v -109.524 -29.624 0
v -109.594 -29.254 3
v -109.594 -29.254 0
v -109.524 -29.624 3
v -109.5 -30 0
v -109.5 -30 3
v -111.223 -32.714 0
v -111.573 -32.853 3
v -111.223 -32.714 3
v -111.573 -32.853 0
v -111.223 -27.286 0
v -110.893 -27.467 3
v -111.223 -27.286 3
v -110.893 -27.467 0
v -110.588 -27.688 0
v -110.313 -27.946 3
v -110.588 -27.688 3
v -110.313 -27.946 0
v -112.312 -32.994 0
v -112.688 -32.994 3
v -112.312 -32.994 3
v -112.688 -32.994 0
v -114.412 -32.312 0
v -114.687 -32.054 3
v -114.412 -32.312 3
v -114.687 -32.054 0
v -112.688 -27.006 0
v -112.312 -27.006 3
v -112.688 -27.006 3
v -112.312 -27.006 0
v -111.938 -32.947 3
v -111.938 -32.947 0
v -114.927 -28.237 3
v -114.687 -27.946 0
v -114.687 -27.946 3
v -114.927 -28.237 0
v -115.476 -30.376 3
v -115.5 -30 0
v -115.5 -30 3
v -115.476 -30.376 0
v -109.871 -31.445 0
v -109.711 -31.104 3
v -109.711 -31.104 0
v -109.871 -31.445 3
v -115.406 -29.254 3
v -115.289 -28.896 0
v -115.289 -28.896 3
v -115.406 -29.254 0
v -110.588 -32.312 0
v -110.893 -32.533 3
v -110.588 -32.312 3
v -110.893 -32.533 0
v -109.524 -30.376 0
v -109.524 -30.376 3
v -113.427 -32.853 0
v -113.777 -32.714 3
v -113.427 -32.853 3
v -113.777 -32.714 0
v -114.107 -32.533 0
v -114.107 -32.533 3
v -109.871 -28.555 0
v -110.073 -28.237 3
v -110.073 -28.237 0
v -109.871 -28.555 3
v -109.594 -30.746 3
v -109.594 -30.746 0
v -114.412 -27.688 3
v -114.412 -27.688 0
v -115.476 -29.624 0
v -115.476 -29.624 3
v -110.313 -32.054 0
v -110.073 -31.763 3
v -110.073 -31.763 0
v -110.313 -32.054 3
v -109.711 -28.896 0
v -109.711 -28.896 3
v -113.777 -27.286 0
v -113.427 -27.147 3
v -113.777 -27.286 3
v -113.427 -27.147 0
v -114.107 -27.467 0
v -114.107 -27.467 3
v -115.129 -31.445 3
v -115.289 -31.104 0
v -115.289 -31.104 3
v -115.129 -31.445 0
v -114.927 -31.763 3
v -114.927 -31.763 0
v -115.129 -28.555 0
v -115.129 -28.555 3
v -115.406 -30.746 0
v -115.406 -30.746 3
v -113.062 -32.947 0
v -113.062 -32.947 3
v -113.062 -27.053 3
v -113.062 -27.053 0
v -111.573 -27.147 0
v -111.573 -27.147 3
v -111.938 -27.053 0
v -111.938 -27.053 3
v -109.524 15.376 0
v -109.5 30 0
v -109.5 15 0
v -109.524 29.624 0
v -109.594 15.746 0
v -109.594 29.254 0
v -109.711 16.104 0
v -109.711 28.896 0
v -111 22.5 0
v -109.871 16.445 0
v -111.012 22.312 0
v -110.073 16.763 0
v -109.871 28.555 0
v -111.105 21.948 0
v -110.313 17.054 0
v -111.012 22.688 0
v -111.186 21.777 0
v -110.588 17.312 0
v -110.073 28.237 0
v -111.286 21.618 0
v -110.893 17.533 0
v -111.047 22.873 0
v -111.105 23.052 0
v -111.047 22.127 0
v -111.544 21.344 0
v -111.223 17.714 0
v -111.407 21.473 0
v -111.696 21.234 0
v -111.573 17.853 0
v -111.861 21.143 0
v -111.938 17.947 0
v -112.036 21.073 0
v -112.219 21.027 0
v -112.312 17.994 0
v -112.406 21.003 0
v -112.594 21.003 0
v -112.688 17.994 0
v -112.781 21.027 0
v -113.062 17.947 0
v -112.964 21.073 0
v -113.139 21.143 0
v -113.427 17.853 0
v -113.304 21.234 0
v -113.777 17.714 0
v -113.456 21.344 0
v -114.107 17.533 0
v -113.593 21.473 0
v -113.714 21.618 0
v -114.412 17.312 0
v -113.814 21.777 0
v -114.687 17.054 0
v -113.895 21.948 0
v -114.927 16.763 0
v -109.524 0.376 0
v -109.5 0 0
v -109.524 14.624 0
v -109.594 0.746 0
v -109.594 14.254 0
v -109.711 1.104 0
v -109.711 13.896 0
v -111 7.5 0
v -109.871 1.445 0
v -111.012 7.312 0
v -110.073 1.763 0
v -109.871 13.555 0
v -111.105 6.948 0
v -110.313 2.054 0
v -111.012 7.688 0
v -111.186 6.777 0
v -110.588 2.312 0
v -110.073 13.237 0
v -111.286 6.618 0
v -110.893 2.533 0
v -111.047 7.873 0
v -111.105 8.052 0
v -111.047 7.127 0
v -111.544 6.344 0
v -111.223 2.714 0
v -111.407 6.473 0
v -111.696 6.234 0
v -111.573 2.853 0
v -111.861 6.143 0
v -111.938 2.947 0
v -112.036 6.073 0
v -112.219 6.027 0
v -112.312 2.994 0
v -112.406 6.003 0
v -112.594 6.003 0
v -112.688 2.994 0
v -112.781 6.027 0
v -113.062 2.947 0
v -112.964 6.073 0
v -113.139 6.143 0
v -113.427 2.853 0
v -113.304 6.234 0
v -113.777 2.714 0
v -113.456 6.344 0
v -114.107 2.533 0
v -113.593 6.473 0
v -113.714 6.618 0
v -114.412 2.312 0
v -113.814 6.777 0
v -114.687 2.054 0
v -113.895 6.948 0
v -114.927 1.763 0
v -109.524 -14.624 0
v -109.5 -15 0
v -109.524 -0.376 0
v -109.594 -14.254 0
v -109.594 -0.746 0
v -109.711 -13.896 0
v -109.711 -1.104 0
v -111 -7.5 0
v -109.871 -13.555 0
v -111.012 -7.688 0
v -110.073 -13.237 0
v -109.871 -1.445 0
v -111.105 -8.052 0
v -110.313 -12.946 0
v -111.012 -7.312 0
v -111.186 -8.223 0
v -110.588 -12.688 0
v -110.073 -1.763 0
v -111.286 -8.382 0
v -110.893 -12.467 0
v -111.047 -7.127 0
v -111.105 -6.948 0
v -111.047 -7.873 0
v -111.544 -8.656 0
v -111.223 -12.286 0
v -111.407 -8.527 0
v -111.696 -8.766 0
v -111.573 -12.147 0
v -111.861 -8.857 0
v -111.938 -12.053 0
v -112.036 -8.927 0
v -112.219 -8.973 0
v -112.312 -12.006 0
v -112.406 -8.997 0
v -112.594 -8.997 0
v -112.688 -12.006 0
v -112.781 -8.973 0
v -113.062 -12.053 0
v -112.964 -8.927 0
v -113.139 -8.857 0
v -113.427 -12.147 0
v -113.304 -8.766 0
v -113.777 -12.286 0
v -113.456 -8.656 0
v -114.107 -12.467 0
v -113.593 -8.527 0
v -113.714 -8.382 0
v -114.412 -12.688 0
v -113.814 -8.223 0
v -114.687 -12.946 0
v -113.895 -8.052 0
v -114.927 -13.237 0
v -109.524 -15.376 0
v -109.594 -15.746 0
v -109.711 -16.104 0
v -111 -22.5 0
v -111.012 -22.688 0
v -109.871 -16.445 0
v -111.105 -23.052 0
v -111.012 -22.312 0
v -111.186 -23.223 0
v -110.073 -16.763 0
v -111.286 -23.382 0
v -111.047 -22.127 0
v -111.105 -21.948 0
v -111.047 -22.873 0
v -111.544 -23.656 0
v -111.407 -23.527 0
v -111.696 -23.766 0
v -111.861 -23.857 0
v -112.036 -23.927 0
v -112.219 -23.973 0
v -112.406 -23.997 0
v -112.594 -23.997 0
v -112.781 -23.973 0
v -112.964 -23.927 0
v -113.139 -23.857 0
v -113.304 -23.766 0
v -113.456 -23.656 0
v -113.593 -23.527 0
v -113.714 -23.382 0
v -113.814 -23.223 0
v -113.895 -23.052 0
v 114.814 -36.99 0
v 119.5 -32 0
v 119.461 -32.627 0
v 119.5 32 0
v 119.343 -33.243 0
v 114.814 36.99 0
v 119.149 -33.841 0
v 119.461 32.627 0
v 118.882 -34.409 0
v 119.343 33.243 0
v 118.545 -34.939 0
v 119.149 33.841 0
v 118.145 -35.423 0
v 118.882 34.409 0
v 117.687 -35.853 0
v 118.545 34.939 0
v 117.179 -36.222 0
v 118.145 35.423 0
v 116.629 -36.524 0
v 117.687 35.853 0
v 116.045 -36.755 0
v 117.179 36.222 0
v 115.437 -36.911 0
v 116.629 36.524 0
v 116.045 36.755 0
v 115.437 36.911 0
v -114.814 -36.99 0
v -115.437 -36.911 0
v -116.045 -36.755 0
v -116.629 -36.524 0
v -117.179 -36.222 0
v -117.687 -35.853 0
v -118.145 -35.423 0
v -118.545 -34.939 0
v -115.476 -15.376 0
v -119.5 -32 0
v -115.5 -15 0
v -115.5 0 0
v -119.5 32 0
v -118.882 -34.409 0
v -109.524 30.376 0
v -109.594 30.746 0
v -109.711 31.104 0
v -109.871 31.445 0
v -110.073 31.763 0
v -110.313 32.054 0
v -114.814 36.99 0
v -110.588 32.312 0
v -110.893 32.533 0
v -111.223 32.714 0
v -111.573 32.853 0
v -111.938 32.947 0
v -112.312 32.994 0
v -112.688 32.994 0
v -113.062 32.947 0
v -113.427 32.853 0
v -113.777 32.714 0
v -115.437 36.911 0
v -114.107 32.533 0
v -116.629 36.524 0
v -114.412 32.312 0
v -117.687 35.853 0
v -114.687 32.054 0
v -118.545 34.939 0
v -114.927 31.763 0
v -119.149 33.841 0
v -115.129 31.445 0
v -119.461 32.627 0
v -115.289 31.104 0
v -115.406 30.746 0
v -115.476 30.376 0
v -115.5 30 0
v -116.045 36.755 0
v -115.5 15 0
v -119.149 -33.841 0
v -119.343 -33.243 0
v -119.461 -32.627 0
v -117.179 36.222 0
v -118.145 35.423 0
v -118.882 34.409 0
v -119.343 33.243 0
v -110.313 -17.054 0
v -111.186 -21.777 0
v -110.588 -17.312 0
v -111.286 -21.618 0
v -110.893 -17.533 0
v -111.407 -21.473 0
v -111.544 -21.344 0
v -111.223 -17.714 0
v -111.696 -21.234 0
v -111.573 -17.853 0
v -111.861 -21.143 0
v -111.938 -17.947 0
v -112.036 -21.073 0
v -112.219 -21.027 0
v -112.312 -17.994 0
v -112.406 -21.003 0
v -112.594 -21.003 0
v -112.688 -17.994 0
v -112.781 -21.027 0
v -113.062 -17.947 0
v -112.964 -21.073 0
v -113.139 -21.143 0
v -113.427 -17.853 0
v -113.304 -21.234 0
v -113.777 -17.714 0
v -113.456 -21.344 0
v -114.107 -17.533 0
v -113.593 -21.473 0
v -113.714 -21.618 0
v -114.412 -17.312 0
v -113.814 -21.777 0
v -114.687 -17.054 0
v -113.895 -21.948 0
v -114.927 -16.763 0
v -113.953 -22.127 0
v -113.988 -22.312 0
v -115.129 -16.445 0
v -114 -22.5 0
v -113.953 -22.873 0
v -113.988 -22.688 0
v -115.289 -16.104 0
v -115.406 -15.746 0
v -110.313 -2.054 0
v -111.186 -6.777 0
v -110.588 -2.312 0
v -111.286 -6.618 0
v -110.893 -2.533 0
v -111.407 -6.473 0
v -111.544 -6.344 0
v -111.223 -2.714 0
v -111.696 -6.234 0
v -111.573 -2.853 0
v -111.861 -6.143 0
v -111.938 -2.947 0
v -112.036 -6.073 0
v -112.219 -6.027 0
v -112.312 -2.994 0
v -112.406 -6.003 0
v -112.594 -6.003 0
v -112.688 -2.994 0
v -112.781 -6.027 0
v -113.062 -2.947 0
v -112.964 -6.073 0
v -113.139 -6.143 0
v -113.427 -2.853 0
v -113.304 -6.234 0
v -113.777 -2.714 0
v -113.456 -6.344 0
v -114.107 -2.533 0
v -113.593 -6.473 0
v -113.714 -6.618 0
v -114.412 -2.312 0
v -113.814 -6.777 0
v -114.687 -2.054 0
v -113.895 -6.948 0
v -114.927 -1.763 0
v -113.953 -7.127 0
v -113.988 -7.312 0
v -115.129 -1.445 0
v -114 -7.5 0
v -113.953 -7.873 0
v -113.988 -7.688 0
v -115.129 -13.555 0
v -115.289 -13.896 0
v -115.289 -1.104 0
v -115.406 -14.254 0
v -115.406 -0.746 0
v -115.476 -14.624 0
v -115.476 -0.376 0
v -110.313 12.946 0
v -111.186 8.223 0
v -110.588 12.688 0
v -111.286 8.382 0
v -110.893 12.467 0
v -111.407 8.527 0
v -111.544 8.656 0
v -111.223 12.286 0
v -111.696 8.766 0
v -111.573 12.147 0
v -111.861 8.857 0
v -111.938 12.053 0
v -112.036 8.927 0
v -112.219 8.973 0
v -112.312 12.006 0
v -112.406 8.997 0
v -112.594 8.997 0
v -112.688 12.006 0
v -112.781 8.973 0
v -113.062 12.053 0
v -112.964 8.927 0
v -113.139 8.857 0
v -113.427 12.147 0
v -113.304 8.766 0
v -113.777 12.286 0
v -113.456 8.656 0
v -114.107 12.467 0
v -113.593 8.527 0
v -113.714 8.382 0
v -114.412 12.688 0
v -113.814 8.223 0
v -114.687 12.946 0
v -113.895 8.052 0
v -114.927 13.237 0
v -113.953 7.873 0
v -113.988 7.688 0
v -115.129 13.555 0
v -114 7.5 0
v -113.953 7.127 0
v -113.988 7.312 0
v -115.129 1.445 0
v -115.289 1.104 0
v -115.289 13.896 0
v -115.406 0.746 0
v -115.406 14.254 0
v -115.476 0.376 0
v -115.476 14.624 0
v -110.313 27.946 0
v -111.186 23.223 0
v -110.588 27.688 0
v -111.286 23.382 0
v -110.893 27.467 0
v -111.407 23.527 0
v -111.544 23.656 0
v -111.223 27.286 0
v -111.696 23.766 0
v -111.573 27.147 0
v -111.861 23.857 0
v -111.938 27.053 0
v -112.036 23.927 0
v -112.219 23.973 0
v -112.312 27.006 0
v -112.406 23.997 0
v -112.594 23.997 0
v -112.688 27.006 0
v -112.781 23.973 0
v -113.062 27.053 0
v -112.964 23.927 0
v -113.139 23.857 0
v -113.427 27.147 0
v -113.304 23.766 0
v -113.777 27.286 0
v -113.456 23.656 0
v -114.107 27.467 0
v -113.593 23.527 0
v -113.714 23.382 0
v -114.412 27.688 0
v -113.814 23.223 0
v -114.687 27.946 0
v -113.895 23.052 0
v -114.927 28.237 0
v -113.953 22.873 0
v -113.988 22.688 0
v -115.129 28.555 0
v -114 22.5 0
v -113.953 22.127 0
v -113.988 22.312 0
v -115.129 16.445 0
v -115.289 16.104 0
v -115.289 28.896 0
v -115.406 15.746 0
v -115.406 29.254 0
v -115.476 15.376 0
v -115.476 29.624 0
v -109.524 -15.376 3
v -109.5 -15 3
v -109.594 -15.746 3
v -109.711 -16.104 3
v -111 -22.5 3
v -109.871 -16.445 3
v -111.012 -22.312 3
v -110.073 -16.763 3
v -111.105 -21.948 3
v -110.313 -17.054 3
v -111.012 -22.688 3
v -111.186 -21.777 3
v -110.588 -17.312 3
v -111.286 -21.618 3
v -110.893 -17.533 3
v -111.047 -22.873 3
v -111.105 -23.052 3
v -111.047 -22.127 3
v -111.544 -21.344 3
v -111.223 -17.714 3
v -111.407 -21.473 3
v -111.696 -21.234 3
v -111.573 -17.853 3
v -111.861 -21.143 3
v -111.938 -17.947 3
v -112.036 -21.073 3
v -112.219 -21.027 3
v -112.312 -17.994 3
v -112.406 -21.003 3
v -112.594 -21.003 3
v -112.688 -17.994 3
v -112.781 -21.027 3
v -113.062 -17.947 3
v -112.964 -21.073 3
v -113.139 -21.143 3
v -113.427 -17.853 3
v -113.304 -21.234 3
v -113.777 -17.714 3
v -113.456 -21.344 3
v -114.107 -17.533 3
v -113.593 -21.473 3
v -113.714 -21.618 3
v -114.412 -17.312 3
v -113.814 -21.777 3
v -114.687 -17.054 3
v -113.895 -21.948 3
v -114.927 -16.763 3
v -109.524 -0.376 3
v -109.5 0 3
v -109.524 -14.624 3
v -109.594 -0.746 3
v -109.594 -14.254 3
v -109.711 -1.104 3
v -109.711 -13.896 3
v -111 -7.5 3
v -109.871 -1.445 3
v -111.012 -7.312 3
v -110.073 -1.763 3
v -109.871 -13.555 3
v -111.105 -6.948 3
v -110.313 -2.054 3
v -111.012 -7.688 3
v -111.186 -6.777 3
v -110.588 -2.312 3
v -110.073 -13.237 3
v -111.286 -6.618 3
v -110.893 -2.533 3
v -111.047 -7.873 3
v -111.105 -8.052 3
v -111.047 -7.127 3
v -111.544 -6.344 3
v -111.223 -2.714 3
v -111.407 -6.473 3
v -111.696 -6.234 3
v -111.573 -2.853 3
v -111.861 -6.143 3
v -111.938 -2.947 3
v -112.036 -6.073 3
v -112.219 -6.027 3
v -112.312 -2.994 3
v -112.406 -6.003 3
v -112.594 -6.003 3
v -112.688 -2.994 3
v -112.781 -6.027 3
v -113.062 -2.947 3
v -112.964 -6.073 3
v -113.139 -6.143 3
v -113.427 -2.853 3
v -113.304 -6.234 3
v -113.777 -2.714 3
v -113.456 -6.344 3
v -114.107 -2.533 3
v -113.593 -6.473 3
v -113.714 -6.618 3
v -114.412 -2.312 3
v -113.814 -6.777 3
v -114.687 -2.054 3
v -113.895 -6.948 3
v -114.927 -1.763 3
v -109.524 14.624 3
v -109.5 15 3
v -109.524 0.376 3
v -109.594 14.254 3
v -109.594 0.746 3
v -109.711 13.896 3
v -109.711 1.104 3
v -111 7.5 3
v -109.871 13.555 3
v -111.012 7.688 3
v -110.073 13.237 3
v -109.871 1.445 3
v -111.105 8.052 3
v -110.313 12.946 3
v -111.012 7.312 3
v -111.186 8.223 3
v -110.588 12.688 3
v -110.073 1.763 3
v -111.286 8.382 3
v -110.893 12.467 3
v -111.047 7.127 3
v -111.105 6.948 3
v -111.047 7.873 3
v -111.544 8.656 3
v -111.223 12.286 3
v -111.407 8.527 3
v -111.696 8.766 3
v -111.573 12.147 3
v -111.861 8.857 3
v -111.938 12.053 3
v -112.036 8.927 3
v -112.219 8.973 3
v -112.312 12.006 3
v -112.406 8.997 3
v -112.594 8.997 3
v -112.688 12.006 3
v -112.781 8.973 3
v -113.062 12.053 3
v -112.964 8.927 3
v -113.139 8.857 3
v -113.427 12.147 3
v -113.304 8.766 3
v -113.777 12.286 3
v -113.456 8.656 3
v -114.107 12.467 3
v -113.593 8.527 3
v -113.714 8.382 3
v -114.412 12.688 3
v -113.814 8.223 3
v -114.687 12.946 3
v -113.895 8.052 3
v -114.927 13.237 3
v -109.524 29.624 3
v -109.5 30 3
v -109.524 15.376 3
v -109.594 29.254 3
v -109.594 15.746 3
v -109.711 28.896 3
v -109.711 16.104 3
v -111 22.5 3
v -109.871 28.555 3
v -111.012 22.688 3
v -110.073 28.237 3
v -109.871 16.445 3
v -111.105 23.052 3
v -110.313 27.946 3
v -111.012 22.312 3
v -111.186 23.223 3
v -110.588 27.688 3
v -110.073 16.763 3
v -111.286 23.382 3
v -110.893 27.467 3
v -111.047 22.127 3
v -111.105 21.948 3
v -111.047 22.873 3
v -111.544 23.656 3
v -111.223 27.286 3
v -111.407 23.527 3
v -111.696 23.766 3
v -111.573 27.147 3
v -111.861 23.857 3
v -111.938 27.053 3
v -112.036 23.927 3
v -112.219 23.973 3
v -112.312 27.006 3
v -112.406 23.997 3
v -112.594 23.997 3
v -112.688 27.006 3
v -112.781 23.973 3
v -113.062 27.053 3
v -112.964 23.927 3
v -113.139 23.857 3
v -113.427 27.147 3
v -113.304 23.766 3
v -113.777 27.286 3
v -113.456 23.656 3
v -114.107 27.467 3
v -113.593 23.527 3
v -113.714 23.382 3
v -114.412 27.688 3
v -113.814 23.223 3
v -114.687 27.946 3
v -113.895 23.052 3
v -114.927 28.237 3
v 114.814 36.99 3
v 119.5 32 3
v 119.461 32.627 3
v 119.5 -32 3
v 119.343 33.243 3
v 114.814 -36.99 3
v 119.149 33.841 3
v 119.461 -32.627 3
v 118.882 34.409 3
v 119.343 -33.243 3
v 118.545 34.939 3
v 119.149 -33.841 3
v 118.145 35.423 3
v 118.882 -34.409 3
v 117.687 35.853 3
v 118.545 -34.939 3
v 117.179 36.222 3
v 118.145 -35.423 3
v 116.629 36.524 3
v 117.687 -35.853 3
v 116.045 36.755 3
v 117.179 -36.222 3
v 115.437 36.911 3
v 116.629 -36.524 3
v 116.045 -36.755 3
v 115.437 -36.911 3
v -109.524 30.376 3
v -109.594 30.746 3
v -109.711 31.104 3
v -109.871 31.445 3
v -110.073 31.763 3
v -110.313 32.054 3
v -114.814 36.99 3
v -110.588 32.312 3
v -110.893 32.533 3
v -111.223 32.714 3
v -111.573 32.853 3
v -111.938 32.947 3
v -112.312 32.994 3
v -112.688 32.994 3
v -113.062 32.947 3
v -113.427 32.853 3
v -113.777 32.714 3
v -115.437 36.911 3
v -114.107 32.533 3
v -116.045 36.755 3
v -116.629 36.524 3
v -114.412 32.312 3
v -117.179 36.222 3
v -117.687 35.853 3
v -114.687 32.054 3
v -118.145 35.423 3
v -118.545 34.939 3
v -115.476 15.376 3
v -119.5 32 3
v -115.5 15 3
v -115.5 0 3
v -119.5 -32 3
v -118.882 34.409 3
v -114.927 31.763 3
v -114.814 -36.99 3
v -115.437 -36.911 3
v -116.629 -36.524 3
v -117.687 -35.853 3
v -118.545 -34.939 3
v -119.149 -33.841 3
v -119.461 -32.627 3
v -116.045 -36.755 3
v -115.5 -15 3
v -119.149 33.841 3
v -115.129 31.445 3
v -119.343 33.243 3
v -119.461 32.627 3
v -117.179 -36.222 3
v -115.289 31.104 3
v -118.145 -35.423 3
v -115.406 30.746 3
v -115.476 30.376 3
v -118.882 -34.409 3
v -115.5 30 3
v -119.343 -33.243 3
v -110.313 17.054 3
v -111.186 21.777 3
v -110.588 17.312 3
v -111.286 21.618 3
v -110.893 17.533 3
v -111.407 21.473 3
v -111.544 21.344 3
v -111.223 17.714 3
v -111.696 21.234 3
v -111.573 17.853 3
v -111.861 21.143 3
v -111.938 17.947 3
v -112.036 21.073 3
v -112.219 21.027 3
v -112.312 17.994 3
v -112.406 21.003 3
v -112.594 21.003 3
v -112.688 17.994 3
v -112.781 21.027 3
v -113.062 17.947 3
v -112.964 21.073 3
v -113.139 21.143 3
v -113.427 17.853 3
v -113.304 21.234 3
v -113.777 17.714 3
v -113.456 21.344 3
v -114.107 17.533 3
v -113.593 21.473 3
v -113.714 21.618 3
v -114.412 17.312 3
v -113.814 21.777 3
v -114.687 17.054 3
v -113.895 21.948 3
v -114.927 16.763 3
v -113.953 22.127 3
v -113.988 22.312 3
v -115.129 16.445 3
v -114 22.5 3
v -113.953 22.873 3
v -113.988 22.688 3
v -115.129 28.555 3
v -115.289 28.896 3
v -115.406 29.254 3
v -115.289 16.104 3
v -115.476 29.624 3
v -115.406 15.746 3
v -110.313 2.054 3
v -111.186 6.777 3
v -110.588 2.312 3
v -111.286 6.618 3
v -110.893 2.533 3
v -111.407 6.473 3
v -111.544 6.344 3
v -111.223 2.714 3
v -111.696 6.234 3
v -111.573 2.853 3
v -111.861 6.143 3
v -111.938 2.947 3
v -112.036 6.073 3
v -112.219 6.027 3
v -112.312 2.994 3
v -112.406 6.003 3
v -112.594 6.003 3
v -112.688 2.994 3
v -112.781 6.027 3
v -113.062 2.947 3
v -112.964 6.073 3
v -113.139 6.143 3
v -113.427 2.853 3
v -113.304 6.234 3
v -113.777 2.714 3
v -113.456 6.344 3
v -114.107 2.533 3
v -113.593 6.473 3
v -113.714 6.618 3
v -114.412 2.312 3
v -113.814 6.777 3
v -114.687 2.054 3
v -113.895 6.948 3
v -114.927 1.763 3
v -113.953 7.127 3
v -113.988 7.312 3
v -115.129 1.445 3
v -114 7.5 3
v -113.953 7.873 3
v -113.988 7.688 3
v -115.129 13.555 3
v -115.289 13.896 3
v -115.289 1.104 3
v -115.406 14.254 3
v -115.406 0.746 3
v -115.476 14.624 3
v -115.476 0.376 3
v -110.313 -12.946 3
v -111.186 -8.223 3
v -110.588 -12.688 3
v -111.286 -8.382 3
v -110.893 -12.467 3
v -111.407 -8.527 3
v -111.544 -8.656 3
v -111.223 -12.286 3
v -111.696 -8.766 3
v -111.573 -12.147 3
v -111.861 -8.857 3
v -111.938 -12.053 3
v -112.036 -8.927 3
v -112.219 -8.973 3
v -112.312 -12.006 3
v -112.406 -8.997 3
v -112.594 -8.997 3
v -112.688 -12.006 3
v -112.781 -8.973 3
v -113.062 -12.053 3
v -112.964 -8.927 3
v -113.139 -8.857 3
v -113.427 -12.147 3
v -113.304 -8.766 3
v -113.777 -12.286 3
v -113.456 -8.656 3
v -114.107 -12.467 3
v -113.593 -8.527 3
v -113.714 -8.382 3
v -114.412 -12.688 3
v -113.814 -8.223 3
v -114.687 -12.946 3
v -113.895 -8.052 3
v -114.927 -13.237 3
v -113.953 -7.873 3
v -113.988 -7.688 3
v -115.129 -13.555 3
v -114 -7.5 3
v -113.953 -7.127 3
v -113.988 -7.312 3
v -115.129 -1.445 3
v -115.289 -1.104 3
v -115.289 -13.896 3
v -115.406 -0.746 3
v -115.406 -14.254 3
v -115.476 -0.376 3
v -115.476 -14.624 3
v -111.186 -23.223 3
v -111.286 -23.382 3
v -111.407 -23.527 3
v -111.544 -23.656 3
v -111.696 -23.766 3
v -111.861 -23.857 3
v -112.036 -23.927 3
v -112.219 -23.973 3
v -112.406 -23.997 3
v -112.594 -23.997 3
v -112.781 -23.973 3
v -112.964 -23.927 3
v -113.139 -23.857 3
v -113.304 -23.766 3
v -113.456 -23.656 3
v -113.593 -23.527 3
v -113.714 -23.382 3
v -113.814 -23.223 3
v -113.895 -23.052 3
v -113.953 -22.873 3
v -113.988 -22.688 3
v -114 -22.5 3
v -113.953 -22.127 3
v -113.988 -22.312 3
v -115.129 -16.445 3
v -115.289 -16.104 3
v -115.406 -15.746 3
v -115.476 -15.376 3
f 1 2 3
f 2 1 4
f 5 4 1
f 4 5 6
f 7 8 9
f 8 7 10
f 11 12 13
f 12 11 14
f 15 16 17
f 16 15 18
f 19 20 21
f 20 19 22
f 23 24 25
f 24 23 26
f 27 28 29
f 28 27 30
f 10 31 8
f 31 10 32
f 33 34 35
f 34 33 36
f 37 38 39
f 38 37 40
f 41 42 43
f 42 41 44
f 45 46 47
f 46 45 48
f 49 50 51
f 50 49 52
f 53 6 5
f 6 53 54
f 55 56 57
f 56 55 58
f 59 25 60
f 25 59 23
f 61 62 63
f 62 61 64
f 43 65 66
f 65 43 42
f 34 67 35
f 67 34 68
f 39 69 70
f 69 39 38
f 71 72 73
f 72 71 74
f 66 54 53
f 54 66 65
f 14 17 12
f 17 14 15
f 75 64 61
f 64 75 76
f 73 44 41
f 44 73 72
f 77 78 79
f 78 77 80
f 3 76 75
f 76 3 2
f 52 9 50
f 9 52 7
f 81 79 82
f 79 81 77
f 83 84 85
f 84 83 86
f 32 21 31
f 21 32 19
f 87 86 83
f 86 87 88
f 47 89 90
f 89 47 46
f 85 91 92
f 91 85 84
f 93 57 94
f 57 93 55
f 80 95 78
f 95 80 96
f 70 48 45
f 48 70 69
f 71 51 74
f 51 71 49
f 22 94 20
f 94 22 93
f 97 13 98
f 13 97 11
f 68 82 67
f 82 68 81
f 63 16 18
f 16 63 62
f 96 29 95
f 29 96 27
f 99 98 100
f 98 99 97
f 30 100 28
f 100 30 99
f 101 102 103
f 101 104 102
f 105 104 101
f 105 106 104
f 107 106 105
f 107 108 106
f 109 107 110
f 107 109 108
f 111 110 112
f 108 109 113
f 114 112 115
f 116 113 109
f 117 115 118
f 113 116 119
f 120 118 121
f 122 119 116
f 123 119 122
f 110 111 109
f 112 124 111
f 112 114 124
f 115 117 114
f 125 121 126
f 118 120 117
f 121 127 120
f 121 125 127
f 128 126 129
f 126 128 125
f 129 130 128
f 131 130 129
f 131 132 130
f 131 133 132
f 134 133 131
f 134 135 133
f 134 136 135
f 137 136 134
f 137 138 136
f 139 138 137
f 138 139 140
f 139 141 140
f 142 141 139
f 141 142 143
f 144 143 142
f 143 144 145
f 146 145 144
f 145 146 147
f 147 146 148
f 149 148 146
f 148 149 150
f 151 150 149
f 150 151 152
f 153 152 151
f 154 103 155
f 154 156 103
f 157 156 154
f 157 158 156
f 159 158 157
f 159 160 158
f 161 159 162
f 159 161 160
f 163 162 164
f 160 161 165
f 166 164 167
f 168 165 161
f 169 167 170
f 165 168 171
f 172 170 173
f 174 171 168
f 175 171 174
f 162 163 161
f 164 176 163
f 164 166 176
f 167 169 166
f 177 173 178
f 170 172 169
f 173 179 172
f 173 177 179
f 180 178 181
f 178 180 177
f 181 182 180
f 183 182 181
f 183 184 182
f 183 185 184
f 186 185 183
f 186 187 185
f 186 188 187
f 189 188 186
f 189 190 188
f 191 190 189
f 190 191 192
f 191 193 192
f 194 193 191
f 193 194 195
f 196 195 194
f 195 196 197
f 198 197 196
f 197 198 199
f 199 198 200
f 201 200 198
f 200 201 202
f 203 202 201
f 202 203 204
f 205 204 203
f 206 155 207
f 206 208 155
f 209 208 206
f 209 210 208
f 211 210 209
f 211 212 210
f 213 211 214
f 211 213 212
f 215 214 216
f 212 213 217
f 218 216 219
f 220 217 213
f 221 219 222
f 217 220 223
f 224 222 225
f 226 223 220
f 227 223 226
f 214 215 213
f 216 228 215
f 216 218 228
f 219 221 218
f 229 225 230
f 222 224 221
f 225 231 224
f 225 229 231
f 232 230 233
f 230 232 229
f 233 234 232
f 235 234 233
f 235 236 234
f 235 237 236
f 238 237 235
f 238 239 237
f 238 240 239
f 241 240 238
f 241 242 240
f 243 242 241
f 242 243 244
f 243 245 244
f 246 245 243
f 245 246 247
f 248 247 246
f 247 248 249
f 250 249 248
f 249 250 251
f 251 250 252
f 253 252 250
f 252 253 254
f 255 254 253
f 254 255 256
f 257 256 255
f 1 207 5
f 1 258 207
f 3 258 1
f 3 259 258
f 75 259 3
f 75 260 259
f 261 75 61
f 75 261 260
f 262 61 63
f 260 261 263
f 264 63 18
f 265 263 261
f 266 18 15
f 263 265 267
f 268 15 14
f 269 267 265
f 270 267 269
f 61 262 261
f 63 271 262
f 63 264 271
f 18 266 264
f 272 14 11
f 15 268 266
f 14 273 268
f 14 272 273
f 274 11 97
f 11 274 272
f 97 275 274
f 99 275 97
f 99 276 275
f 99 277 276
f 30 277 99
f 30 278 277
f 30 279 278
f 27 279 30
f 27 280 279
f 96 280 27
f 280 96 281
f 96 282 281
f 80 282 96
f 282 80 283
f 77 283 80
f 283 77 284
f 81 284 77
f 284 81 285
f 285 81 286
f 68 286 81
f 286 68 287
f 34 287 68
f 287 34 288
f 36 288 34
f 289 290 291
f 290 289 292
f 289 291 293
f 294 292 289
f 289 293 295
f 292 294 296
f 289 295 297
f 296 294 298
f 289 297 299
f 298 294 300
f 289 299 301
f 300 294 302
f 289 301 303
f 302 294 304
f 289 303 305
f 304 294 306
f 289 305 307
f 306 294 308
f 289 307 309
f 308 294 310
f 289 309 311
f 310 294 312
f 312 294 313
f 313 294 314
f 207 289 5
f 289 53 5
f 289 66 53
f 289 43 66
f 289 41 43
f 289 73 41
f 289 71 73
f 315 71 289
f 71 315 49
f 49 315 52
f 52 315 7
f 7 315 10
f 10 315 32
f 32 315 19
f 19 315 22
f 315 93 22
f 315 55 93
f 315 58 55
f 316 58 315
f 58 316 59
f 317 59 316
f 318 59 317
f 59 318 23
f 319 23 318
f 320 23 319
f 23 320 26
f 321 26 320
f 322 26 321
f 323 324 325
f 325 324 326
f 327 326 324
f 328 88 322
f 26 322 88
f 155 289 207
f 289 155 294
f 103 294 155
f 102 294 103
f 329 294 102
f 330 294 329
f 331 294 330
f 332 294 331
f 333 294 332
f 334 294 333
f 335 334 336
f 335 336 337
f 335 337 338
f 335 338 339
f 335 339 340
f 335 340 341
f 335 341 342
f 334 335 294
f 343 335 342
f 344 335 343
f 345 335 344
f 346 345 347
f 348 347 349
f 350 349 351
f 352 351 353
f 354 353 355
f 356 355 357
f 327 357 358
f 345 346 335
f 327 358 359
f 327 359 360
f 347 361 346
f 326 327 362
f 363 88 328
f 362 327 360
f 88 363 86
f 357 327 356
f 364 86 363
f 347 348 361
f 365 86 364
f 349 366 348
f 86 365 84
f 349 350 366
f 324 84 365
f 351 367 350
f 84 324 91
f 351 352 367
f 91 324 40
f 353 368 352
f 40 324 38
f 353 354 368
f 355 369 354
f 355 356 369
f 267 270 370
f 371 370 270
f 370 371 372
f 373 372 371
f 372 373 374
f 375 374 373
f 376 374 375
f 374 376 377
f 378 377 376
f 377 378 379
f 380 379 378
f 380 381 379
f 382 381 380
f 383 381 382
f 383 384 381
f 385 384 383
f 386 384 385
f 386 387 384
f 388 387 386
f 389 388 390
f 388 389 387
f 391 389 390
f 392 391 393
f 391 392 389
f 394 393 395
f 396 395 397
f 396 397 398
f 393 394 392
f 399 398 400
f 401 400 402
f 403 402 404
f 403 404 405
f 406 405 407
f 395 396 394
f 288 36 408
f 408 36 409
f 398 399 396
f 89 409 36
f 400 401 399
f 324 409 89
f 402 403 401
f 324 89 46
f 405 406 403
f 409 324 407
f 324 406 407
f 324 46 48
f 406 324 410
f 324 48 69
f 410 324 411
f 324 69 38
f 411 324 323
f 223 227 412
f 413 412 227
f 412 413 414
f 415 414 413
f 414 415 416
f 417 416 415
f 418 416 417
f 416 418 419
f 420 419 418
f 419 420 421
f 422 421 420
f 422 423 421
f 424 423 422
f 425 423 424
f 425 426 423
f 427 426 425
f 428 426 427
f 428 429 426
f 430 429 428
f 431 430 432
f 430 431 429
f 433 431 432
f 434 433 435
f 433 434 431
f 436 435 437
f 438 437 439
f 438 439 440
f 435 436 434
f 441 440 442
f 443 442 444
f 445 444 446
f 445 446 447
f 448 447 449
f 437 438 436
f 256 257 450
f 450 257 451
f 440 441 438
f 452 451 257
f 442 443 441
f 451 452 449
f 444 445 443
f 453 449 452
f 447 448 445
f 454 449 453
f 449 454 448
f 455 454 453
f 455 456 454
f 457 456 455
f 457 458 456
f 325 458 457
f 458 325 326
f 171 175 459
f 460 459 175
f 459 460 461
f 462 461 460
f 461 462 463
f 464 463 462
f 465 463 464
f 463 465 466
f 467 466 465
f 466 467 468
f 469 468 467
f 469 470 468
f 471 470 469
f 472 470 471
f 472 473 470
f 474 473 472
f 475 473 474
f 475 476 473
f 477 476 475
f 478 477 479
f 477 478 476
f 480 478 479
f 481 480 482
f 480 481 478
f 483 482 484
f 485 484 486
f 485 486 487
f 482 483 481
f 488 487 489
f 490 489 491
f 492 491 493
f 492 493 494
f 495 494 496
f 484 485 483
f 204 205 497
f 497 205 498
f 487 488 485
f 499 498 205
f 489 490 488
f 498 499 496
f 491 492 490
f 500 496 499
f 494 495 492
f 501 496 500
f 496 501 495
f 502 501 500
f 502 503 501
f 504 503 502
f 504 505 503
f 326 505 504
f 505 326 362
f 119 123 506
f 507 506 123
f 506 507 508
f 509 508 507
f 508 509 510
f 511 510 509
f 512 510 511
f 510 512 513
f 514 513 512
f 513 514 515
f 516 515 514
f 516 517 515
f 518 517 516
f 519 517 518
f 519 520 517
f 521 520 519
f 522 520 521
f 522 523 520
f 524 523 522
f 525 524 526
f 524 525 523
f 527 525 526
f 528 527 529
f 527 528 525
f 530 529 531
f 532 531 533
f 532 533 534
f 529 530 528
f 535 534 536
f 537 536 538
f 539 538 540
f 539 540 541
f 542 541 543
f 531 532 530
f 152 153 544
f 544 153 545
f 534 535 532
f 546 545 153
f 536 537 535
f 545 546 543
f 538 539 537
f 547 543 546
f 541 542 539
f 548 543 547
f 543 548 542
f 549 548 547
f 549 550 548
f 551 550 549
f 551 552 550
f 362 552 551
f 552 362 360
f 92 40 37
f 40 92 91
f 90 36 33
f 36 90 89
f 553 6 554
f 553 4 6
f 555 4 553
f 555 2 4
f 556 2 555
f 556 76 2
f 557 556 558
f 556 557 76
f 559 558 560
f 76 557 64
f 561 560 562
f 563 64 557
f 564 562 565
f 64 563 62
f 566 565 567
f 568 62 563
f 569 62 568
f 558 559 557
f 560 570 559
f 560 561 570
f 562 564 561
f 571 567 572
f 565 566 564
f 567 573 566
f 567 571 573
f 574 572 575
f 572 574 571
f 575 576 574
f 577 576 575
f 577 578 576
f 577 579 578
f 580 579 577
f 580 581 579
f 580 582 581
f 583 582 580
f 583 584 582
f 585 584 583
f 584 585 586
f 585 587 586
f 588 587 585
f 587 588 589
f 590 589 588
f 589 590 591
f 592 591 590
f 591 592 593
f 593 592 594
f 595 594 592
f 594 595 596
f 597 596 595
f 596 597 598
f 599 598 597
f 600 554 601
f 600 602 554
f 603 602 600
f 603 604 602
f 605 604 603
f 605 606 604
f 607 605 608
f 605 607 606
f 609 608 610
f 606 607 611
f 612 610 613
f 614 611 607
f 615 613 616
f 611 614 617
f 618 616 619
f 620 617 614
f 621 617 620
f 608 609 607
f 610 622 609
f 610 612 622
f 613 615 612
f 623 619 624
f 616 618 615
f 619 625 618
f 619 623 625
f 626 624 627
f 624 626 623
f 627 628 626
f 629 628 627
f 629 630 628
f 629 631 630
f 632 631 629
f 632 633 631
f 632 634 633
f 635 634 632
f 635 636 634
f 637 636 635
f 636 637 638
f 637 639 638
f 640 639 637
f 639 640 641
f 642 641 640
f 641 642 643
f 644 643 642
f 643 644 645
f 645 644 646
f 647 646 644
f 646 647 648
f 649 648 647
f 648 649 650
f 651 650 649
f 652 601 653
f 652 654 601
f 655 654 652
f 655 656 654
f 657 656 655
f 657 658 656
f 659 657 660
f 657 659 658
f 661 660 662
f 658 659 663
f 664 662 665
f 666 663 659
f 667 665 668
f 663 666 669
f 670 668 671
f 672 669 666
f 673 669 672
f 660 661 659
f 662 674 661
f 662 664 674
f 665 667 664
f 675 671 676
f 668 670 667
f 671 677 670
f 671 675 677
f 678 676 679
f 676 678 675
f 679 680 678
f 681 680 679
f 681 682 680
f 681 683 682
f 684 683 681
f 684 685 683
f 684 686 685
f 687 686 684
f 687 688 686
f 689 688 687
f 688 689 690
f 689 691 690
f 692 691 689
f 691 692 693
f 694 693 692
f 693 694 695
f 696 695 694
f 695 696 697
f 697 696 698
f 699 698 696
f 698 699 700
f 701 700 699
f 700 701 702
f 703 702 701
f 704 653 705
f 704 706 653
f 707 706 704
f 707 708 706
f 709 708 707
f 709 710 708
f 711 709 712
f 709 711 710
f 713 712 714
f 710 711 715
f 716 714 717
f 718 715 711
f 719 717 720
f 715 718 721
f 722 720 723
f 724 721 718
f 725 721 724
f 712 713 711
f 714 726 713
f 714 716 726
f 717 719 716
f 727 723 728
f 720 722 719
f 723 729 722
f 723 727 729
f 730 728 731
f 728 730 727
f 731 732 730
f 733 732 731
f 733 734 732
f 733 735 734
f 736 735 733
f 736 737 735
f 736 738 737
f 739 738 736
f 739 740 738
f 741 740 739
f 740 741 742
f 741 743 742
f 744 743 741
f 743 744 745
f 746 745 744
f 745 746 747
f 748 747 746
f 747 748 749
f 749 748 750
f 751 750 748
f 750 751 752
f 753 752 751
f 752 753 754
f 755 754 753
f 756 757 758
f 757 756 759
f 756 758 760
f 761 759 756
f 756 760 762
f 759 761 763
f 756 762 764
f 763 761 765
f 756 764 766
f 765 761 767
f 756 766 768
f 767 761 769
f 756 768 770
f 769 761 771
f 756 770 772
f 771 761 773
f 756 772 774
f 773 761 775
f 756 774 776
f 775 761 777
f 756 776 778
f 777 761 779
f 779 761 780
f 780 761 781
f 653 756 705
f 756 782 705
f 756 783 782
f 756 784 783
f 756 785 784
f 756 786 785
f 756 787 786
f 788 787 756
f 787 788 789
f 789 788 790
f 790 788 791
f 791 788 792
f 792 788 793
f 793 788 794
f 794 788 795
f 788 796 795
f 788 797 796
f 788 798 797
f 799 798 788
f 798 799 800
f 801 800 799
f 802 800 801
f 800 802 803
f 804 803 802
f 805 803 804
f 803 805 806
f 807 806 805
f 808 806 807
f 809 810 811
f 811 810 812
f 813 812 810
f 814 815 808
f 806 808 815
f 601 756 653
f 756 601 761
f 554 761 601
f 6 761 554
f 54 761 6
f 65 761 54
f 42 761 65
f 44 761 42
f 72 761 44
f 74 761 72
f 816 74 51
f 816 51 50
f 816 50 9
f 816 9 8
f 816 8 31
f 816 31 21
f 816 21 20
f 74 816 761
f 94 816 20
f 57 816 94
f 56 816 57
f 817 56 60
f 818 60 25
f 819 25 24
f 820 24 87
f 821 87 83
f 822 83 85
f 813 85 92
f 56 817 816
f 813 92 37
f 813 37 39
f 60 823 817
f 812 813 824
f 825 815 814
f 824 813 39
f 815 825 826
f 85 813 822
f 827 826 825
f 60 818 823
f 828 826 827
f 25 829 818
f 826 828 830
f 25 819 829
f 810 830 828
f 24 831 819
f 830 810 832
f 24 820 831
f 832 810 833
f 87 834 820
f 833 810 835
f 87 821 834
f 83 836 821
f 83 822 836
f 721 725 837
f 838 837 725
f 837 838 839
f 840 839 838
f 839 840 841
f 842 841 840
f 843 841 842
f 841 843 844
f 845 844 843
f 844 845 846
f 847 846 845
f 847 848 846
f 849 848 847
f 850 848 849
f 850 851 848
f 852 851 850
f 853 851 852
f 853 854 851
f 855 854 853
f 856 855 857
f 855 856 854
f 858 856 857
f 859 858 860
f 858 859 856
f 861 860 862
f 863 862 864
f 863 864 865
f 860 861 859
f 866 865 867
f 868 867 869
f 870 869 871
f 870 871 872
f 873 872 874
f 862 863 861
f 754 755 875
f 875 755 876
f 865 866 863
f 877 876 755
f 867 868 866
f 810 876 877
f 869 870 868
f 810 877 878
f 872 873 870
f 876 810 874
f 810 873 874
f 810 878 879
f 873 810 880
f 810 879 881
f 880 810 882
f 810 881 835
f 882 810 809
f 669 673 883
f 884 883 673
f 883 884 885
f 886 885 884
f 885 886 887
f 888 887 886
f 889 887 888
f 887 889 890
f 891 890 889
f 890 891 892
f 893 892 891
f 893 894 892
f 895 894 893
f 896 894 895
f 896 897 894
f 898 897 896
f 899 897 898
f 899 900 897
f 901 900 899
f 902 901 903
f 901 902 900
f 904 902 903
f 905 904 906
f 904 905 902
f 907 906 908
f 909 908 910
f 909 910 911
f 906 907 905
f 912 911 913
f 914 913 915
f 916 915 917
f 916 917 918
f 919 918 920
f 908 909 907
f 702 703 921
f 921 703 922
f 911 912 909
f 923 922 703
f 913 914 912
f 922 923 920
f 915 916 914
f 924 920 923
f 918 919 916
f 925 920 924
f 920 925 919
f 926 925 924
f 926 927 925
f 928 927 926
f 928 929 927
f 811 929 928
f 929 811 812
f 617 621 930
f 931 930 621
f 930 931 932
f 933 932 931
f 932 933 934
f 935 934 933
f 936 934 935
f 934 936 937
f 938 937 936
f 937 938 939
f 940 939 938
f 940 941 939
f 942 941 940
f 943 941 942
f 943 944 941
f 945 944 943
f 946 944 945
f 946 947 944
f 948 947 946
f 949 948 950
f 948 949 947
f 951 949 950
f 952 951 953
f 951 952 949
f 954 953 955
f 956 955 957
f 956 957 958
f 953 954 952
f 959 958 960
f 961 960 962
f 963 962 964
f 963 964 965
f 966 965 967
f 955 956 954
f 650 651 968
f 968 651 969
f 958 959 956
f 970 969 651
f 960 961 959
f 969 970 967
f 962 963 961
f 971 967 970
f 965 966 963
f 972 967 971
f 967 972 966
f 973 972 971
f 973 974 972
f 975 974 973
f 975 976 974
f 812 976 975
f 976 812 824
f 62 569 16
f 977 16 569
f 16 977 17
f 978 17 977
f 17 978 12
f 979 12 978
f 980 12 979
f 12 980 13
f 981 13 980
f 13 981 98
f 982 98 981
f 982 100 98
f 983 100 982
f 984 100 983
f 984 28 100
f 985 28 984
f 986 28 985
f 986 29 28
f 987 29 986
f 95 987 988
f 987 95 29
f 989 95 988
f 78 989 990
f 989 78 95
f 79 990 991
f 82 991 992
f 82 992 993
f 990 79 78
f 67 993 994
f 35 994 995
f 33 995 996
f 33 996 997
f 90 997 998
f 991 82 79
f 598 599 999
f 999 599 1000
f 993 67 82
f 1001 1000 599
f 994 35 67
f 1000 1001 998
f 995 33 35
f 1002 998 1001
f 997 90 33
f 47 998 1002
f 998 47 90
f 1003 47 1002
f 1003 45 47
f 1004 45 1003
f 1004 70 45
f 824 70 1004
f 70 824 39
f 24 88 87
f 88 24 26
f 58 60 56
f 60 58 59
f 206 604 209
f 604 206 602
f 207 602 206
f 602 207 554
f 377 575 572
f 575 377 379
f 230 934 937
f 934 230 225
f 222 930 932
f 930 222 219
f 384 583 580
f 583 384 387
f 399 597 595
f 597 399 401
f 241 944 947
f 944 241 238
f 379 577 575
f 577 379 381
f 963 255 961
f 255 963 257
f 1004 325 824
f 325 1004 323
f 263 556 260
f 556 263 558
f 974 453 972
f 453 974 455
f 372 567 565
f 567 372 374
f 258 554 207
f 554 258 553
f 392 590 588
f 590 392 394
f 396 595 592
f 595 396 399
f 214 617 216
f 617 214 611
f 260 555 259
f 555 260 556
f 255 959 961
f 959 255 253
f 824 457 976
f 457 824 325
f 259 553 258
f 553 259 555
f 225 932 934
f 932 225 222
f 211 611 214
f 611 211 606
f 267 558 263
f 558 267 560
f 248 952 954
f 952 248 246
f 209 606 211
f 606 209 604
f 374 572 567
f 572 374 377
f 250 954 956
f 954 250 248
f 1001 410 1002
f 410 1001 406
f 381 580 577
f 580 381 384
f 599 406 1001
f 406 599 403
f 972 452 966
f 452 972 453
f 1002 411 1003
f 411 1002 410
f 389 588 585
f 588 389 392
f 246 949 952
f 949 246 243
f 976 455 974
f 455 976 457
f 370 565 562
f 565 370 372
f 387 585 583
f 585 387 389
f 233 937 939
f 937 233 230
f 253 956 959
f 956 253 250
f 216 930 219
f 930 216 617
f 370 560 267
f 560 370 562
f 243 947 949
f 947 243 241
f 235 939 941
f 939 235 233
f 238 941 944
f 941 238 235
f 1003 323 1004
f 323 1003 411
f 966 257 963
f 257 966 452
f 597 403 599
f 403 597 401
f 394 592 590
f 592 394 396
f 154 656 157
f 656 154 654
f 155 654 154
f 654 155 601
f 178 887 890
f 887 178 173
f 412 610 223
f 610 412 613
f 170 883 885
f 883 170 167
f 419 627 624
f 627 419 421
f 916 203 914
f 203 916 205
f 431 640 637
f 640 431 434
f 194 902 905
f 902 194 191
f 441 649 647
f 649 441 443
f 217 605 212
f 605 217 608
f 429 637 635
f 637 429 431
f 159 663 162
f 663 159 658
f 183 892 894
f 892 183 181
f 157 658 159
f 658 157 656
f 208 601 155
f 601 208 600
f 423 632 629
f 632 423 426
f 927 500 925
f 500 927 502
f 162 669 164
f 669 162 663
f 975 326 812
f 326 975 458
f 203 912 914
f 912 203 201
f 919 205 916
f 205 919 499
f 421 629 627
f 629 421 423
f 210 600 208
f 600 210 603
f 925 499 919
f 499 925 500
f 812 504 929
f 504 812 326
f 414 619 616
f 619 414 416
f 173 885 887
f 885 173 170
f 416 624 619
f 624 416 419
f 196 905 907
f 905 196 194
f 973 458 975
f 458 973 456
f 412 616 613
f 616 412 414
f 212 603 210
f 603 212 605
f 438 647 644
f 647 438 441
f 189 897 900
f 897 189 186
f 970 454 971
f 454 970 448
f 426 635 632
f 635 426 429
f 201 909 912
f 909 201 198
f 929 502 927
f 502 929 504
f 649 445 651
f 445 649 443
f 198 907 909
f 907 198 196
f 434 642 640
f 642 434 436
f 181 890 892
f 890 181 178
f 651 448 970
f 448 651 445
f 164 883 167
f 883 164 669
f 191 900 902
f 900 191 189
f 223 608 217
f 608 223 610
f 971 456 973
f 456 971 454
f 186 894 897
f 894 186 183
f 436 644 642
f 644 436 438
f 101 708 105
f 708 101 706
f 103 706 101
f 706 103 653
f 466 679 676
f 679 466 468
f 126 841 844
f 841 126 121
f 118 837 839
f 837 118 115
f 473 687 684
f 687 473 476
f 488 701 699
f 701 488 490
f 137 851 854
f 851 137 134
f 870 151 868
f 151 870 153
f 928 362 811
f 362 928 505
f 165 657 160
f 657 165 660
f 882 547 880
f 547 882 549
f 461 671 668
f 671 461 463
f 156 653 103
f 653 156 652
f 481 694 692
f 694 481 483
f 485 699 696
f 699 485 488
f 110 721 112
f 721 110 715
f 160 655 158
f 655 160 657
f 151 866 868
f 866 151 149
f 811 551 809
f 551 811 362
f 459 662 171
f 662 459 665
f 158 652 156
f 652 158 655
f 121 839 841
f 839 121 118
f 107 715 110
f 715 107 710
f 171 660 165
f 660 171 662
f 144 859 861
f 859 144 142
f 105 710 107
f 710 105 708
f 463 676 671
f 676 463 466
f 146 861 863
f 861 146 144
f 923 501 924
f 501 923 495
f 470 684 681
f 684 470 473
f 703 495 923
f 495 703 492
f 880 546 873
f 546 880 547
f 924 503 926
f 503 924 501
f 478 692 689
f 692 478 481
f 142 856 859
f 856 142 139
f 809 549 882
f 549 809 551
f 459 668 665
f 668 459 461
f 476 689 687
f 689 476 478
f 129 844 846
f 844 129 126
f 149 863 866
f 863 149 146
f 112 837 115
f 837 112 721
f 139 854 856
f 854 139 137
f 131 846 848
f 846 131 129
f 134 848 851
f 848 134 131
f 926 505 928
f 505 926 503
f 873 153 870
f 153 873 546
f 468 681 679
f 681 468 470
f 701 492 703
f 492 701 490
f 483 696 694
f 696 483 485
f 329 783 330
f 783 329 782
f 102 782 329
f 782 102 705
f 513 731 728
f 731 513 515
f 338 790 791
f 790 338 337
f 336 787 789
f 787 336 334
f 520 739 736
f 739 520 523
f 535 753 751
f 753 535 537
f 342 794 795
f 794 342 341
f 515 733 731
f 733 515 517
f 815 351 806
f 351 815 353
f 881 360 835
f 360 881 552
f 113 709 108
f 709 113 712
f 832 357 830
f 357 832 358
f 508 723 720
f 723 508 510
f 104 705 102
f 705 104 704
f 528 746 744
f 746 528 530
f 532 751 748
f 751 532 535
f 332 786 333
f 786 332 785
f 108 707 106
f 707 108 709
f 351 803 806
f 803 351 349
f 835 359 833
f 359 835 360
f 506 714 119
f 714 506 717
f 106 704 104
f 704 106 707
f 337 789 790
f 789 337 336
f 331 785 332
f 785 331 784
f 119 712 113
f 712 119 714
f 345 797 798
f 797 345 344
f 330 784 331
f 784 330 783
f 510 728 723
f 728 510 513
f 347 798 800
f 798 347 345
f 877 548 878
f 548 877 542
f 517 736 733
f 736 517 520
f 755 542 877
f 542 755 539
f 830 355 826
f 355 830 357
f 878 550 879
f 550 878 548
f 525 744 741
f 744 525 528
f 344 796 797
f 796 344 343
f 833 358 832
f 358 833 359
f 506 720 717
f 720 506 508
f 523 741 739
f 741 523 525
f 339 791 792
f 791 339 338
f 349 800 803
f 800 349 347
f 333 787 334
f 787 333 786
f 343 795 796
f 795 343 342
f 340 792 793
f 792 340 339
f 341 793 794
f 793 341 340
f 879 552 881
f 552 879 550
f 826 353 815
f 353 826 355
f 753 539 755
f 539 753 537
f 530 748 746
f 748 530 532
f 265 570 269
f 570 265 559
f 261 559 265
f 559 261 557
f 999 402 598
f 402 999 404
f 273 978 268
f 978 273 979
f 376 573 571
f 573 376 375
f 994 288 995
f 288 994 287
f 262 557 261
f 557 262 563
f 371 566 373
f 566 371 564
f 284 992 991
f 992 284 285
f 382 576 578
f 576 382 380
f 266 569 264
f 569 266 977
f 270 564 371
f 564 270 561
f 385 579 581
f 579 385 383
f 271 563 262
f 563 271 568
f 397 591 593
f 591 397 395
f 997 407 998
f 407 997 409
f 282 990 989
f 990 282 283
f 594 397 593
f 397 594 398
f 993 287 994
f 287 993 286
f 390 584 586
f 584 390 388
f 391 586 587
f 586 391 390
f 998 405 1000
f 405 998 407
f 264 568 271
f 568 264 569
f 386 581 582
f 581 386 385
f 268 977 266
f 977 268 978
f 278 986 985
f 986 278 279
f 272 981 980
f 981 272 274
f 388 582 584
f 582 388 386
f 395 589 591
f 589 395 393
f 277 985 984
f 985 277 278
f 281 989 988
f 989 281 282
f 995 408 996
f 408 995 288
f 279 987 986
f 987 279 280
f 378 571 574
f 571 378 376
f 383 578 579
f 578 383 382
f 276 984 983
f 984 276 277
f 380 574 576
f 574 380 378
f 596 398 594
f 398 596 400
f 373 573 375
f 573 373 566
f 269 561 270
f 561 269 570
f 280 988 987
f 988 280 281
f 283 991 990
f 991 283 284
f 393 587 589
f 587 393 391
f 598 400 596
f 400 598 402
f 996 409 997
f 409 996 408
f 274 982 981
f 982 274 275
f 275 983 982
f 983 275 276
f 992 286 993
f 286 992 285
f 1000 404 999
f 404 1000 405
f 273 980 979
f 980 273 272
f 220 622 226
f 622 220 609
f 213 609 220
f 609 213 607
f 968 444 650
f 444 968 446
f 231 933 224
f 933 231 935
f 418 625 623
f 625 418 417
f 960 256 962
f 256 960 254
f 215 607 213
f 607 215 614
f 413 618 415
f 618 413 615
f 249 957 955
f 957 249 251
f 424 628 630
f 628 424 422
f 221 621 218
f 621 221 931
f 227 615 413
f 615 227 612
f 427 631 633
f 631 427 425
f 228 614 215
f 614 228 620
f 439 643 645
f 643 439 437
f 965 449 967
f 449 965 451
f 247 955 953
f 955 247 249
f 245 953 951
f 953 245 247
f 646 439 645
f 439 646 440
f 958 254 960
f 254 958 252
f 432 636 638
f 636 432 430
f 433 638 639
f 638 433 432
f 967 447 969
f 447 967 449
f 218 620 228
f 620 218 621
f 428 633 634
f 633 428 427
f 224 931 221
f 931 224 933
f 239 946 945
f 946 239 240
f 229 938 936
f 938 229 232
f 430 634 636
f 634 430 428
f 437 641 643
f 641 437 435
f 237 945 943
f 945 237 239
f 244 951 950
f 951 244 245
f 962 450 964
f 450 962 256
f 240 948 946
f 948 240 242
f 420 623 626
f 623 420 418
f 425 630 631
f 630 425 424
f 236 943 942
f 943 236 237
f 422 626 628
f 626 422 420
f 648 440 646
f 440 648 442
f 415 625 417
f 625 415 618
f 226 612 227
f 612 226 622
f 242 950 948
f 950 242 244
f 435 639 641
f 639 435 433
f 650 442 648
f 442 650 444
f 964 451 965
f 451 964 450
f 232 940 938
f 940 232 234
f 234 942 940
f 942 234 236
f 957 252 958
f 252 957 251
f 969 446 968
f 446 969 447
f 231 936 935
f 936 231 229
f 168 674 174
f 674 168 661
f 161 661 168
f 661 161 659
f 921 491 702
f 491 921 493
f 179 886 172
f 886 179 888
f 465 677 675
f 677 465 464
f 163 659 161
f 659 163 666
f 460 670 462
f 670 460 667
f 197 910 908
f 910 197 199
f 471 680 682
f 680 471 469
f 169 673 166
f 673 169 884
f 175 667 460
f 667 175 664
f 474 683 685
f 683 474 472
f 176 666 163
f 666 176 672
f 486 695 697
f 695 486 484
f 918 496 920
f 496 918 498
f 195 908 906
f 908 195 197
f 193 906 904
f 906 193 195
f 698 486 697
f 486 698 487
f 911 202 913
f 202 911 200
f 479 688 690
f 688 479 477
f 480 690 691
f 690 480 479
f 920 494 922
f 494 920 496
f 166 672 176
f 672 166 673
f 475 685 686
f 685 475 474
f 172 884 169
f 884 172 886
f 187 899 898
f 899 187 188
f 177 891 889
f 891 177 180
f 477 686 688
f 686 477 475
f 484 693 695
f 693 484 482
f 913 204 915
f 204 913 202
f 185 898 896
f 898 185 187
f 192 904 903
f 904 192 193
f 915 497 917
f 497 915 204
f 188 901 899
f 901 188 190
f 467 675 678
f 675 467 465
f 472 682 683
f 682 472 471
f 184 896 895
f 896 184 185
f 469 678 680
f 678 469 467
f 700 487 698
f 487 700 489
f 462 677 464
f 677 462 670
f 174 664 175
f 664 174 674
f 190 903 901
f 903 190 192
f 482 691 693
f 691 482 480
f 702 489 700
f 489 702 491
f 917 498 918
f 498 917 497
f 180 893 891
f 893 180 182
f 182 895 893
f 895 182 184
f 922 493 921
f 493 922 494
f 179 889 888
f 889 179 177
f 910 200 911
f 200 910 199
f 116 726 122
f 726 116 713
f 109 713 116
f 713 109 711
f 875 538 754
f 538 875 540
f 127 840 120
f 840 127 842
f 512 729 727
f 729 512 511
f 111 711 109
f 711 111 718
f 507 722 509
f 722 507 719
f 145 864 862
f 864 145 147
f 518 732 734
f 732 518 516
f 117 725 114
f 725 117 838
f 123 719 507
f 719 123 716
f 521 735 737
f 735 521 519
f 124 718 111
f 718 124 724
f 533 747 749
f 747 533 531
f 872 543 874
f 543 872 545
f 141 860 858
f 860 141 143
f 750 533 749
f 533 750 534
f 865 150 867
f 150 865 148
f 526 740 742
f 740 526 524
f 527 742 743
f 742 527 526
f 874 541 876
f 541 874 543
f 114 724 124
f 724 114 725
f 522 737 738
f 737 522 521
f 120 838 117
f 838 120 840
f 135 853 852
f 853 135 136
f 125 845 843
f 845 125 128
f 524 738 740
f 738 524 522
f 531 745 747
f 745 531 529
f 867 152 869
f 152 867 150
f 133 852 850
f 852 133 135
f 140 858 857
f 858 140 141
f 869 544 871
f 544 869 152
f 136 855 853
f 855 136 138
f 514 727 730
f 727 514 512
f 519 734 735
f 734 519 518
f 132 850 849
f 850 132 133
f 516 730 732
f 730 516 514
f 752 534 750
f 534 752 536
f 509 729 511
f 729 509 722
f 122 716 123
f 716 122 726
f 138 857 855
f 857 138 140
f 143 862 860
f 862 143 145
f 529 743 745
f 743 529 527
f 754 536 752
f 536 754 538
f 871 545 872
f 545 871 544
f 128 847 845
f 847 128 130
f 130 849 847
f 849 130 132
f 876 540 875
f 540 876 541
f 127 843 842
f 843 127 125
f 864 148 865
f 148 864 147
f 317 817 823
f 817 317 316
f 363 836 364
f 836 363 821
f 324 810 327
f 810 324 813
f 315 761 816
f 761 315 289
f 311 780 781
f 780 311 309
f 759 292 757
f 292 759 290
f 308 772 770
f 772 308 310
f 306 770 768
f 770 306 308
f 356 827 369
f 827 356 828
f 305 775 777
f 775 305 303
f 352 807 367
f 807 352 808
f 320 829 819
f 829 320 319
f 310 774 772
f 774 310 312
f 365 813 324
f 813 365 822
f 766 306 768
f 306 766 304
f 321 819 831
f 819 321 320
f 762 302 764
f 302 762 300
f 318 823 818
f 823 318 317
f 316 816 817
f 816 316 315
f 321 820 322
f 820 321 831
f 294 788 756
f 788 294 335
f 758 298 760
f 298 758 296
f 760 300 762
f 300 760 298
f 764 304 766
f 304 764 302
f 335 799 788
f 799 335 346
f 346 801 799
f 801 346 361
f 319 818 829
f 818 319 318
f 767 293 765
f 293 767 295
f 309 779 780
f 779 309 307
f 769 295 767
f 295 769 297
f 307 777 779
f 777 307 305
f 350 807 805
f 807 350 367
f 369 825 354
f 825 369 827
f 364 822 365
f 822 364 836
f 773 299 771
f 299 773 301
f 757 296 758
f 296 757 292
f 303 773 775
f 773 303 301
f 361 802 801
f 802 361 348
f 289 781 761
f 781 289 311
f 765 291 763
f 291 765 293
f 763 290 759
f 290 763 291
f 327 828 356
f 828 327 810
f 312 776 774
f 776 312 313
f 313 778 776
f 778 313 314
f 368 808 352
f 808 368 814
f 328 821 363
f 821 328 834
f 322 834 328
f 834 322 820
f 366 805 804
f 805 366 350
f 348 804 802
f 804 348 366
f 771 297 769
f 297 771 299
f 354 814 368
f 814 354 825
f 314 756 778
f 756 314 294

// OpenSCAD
$fn = 50;


difference() {
	union() {
		hull() {
			translate(v = [-114.5000000000, 32.0000000000, 0]) {
				cylinder(h = 3, r = 5);
			}
			translate(v = [114.5000000000, 32.0000000000, 0]) {
				cylinder(h = 3, r = 5);
			}
			translate(v = [-114.5000000000, -32.0000000000, 0]) {
				cylinder(h = 3, r = 5);
			}
			translate(v = [114.5000000000, -32.0000000000, 0]) {
				cylinder(h = 3, r = 5);
			}
		}
	}
	union() {
		translate(v = [-112.5000000000, -30.0000000000, 0]) {
			cylinder(h = 3, r = 3.0000000000);
		}
		translate(v = [-112.5000000000, -15.0000000000, 0]) {
			cylinder(h = 3, r = 3.0000000000);
		}
		translate(v = [-112.5000000000, 0.0000000000, 0]) {
			cylinder(h = 3, r = 3.0000000000);
		}
		translate(v = [-112.5000000000, 15.0000000000, 0]) {
			cylinder(h = 3, r = 3.0000000000);
		}
		translate(v = [-112.5000000000, 30.0000000000, 0]) {
			cylinder(h = 3, r = 3.0000000000);
		}
		translate(v = [-112.5000000000, -30.0000000000, 0]) {
			cylinder(h = 3, r = 1.5000000000);
		}
		translate(v = [-112.5000000000, -22.5000000000, 0]) {
			cylinder(h = 3, r = 1.5000000000);
		}
		translate(v = [-112.5000000000, -15.0000000000, 0]) {
			cylinder(h = 3, r = 1.5000000000);
		}
		translate(v = [-112.5000000000, -7.5000000000, 0]) {
			cylinder(h = 3, r = 1.5000000000);
		}
		translate(v = [-112.5000000000, 0.0000000000, 0]) {
			cylinder(h = 3, r = 1.5000000000);
		}
		translate(v = [-112.5000000000, 7.5000000000, 0]) {
			cylinder(h = 3, r = 1.5000000000);
		}
		translate(v = [-112.5000000000, 15.0000000000, 0]) {
			cylinder(h = 3, r = 1.5000000000);
		}
		translate(v = [-112.5000000000, 22.5000000000, 0]) {
			cylinder(h = 3, r = 1.5000000000);
		}
		translate(v = [-112.5000000000, 30.0000000000, 0]) {
			cylinder(h = 3, r = 1.5000000000);
		}
		translate(v = [-112.5000000000, -30.0000000000, 0]) {
			cylinder(h = 3, r = 1.5000000000);
		}
		translate(v = [-112.5000000000, -22.5000000000, 0]) {
			cylinder(h = 3, r = 1.5000000000);
		}
		translate(v = [-112.5000000000, -15.0000000000, 0]) {
			cylinder(h = 3, r = 1.5000000000);
		}
		translate(v = [-112.5000000000, -7.5000000000, 0]) {
			cylinder(h = 3, r = 1.5000000000);
		}
		translate(v = [-112.5000000000, 0.0000000000, 0]) {
			cylinder(h = 3, r = 1.5000000000);
		}
		translate(v = [-112.5000000000, 7.5000000000, 0]) {
			cylinder(h = 3, r = 1.5000000000);
		}
		translate(v = [-112.5000000000, 15.0000000000, 0]) {
			cylinder(h = 3, r = 1.5000000000);
		}
		translate(v = [-112.5000000000, 22.5000000000, 0]) {
			cylinder(h = 3, r = 1.5000000000);
		}
		translate(v = [-112.5000000000, 30.0000000000, 0]) {
			cylinder(h = 3, r = 1.5000000000);
		}
		translate(v = [-112.5000000000, -30.0000000000, 0]) {
			cylinder(h = 3, r = 1.5000000000);
		}
		translate(v = [-112.5000000000, -22.5000000000, 0]) {
			cylinder(h = 3, r = 1.5000000000);
		}
		translate(v = [-112.5000000000, -15.0000000000, 0]) {
			cylinder(h = 3, r = 1.5000000000);
		}
		translate(v = [-112.5000000000, -7.5000000000, 0]) {
			cylinder(h = 3, r = 1.5000000000);
		}
		translate(v = [-112.5000000000, 0.0000000000, 0]) {
			cylinder(h = 3, r = 1.5000000000);
		}
		translate(v = [-112.5000000000, 7.5000000000, 0]) {
			cylinder(h = 3, r = 1.5000000000);
		}
		translate(v = [-112.5000000000, 15.0000000000, 0]) {
			cylinder(h = 3, r = 1.5000000000);
		}
		translate(v = [-112.5000000000, 22.5000000000, 0]) {
			cylinder(h = 3, r = 1.5000000000);
		}
		translate(v = [-112.5000000000, 30.0000000000, 0]) {
			cylinder(h = 3, r = 1.5000000000);
		}
	}
}
